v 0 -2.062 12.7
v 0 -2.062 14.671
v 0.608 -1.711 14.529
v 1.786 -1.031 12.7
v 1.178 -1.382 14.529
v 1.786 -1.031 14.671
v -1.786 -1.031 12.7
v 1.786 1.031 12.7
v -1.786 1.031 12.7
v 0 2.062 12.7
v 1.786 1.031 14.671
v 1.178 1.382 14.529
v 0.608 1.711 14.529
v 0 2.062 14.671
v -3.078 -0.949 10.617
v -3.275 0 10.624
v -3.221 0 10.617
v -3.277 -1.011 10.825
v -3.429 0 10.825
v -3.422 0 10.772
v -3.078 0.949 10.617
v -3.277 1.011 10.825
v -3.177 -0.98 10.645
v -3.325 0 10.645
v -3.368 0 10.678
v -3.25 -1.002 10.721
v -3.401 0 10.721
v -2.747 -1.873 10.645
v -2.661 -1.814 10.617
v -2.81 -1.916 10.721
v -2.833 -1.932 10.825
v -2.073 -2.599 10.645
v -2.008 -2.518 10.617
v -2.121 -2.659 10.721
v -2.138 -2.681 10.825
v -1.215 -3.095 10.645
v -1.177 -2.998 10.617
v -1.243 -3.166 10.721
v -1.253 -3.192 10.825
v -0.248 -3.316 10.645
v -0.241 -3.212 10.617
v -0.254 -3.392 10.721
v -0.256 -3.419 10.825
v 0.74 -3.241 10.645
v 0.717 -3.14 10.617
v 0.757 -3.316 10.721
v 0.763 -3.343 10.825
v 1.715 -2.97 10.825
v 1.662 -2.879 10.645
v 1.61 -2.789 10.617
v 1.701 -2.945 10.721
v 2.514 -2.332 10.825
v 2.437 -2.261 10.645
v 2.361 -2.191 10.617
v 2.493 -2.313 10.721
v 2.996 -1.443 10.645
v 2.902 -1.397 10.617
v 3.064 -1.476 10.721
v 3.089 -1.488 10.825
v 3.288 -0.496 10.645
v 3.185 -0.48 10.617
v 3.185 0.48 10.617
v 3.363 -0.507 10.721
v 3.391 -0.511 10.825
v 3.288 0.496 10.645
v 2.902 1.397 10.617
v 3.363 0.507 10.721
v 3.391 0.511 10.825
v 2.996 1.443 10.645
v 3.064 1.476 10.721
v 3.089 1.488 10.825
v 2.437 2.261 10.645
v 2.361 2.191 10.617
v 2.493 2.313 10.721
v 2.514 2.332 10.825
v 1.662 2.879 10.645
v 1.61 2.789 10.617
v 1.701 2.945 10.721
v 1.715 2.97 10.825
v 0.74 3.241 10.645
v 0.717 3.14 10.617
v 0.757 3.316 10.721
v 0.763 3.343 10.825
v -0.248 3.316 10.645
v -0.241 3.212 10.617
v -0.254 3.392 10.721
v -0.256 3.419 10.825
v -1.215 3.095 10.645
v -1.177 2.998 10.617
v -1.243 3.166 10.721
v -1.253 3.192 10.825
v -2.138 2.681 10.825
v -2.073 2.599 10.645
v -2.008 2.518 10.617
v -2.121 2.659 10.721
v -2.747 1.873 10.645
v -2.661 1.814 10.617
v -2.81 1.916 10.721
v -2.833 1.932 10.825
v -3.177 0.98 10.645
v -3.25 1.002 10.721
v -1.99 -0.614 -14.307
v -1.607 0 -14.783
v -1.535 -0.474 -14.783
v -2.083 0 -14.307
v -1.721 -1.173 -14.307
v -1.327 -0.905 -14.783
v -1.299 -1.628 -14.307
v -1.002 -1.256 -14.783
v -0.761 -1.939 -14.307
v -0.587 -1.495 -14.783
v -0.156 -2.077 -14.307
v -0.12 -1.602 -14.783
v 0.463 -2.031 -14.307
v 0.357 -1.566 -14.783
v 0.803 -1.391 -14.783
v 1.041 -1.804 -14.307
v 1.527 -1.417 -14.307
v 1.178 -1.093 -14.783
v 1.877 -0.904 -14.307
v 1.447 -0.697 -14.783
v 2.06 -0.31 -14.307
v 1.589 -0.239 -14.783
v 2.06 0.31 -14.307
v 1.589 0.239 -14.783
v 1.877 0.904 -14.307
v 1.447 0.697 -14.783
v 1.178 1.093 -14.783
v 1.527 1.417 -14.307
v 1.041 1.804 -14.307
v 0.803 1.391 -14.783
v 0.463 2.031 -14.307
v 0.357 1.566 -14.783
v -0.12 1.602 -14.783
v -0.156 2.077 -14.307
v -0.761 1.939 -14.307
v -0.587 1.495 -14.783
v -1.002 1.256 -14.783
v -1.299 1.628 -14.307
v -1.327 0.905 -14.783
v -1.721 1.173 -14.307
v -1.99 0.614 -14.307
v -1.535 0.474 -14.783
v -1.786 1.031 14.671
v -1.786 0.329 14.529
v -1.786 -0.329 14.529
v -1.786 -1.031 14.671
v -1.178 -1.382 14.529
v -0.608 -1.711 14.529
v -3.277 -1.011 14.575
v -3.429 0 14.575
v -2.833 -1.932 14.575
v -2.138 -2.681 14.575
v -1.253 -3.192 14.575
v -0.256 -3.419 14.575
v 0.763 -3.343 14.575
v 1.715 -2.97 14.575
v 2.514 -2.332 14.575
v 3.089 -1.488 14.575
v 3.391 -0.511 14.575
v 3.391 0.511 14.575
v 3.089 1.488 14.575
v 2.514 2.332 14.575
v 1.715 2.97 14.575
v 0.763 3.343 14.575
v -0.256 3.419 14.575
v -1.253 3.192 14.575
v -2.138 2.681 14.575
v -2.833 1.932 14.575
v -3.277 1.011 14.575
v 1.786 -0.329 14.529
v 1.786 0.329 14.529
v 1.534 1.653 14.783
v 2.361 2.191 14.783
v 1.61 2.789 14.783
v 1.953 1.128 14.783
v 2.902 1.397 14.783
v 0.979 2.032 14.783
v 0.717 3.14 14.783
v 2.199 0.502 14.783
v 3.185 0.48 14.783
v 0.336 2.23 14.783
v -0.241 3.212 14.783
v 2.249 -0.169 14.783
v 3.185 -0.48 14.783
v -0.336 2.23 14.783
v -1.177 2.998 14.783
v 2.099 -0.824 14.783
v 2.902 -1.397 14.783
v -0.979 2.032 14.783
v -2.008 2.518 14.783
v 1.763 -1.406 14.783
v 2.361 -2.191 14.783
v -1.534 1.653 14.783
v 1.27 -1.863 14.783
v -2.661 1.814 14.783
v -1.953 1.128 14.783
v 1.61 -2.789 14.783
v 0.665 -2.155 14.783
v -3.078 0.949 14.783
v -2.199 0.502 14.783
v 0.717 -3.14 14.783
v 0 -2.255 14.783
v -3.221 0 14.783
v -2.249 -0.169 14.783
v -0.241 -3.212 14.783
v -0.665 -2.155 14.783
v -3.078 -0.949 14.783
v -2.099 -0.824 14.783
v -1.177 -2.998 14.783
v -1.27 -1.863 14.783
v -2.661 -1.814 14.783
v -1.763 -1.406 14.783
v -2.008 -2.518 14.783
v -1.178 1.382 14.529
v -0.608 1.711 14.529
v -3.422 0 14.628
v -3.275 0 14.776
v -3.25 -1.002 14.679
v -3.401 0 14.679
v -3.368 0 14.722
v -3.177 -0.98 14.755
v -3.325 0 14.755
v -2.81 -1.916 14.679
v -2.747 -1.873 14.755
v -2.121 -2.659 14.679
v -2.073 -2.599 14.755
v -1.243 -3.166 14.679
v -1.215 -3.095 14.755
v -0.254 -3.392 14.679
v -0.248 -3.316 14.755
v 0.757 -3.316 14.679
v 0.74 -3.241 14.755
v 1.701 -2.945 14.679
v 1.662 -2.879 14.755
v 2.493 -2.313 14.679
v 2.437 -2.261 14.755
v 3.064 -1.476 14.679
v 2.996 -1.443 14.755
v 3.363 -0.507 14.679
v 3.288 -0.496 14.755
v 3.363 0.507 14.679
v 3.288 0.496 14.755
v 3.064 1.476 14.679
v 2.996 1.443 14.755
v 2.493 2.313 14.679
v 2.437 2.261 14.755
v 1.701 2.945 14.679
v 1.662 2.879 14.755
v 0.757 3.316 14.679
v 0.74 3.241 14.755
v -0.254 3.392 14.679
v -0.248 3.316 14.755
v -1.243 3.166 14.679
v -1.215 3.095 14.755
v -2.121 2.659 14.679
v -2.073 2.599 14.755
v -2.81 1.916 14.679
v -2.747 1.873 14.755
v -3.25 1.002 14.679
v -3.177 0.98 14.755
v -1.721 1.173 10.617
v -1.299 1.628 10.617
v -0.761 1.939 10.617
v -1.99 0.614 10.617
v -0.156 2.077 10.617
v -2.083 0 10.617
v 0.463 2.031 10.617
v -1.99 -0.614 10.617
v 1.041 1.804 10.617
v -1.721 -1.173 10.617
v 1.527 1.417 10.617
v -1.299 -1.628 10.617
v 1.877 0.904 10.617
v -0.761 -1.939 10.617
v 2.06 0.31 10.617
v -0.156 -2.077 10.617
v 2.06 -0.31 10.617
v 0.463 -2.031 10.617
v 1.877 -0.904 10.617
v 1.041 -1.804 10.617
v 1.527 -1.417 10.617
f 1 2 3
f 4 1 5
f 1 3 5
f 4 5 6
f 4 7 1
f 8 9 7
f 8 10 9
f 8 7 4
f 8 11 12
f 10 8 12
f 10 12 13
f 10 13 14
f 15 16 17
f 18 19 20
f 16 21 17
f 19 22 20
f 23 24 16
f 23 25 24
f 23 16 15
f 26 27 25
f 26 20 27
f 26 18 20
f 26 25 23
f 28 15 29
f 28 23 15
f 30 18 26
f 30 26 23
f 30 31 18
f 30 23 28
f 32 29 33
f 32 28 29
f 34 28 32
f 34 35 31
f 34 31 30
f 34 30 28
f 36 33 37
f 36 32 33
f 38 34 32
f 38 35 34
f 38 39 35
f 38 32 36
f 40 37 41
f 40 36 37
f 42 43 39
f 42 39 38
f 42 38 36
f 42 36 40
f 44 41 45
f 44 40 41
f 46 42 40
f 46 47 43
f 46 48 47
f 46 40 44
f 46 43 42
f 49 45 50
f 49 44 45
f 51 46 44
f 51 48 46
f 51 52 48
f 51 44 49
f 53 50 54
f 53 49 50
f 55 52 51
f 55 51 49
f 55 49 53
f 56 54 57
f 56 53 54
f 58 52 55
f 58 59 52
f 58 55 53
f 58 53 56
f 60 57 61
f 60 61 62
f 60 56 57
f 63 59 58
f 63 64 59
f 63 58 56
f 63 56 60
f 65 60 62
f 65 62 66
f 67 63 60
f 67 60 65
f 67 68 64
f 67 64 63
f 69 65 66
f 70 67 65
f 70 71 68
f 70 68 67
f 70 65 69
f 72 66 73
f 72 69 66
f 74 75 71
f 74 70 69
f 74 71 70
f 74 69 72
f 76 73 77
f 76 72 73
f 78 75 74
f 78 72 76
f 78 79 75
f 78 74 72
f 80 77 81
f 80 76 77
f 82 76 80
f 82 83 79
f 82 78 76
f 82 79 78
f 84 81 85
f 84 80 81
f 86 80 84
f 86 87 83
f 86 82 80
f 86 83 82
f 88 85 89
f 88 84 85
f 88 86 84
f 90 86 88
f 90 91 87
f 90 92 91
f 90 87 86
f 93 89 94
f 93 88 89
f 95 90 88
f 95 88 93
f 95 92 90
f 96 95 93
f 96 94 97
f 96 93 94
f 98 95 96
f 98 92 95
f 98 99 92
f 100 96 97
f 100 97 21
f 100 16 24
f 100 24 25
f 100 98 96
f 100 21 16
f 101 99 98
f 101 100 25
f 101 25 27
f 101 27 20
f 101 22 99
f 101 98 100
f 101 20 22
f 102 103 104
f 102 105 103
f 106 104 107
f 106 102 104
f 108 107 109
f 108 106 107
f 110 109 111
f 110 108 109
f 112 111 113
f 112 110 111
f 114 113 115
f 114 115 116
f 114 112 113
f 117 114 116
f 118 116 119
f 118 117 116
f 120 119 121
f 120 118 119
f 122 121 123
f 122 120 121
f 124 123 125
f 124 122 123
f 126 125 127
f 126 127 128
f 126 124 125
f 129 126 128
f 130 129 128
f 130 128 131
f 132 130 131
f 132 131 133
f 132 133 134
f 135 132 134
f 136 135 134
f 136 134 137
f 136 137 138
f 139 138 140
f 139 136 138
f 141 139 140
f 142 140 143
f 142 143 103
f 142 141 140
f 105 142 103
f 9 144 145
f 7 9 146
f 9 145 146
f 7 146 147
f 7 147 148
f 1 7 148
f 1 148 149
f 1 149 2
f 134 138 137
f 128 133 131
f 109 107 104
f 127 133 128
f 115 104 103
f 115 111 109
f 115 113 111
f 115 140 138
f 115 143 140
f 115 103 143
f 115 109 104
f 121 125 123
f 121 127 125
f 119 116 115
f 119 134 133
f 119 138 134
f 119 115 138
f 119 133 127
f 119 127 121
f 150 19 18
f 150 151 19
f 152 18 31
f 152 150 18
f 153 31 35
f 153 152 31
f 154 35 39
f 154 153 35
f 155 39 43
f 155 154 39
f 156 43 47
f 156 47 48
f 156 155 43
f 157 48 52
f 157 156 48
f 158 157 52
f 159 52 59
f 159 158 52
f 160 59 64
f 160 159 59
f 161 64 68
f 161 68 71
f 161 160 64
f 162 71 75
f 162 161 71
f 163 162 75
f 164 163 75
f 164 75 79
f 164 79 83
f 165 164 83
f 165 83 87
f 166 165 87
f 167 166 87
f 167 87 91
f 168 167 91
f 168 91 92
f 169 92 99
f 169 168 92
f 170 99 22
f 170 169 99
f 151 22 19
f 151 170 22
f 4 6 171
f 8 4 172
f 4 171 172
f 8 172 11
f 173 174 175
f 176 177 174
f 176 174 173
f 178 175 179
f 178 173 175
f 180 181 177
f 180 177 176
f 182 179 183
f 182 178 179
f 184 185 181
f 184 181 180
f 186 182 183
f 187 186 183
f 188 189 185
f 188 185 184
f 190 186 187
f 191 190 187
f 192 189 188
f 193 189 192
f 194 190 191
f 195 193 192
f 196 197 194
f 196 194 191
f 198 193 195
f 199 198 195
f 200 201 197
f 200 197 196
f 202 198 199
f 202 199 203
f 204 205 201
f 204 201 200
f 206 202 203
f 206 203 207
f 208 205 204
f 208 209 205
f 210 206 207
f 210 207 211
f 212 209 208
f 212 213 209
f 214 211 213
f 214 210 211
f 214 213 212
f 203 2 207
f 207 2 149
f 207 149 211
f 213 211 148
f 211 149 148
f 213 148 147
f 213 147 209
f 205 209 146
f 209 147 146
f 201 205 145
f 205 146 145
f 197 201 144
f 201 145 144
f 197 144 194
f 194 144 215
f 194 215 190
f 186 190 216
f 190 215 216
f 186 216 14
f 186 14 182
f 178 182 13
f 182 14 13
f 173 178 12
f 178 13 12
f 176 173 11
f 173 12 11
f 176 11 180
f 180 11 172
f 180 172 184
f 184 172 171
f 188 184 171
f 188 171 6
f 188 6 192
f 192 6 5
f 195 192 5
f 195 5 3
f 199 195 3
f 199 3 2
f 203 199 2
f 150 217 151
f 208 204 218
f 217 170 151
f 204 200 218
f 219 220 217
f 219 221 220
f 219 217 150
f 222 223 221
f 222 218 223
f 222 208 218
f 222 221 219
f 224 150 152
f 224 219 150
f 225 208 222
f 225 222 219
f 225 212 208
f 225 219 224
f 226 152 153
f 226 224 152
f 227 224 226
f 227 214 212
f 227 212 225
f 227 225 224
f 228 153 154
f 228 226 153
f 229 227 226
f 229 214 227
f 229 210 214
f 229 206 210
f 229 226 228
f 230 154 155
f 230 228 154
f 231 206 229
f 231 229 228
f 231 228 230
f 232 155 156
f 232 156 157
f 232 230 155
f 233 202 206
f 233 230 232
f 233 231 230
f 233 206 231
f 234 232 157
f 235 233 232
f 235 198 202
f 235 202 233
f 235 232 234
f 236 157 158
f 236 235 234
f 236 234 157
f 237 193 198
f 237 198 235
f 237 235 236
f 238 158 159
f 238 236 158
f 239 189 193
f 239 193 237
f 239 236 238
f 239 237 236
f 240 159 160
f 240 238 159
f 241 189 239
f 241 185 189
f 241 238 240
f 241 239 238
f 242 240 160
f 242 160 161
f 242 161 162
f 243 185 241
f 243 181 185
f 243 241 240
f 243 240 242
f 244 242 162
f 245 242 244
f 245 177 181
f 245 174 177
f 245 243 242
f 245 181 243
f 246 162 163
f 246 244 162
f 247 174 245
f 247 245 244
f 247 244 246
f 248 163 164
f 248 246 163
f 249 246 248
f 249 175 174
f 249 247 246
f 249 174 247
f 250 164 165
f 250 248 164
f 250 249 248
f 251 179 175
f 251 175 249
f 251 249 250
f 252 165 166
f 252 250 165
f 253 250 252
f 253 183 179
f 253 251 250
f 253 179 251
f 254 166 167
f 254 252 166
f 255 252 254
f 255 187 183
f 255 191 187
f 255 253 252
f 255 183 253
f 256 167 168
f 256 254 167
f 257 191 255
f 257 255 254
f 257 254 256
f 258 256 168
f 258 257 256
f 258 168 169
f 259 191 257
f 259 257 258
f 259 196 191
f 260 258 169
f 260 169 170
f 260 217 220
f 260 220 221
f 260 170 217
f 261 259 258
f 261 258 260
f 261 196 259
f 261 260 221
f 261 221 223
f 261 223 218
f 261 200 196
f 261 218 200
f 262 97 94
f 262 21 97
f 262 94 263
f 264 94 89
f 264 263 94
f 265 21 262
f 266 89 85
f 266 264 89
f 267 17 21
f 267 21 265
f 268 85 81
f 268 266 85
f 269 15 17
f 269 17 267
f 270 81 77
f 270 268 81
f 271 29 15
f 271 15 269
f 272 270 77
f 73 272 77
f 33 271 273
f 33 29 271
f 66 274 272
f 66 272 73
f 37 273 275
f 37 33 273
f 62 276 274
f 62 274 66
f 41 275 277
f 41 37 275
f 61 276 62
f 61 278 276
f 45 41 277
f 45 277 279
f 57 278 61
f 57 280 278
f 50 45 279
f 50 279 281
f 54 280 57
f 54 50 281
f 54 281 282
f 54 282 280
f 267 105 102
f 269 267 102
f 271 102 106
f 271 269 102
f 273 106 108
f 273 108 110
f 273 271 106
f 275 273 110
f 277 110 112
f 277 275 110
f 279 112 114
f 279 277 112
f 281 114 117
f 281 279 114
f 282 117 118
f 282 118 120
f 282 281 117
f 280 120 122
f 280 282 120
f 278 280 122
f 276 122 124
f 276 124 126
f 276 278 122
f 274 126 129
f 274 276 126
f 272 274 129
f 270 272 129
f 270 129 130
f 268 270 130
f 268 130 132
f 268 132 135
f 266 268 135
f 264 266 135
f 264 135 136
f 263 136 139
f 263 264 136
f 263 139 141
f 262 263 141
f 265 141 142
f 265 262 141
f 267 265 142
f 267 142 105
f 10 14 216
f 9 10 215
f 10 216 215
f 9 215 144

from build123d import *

# Parameters (mm, degrees)
CUT_EXTRUDE1_START = 14.7828
CUT_EXTRUDE1_DEPTH = 2.0828


with BuildPart() as part:
    # Sketch2 → Revolve1 (revolve)
    with BuildSketch(Plane(origin=(0, 0, 0), x_dir=(0, 0, -1), z_dir=(1, 0, 0)), mode=Mode.PRIVATE) as revolve1_sk:
        with BuildLine():
            Line((14.7828, 0), (14.7828, 1.60655))
            Line((14.7828, 1.60655), (14.30655, 2.0828))
            Line((14.30655, 2.0828), (-10.6172, 2.0828))
            Line((-10.6172, 2.0828), (-10.6172, 3.22072))
            ThreePointArc((-10.6172, 3.22072), (-10.6782038, 3.3679962), (-10.82548, 3.429))
            Line((-10.82548, 3.429), (-14.57452, 3.429))
            ThreePointArc((-14.57452, 3.429), (-14.7217962, 3.3679962), (-14.7828, 3.22072))
            Line((-14.7828, 3.22072), (-14.7828, 0))
            Line((-14.7828, 0), (14.7828, 0))
        make_face()
    revolve(revolve1_sk.sketch.rotate(Axis((0, 0, -14.7828), (0, 0, 1)), 90), axis=Axis((0, 0, -14.7828), (0, 0, 1)))

    # Sketch3 → Cut-Extrude1 (cut)
    with BuildSketch(Plane.XY.offset(CUT_EXTRUDE1_START)):
        Polygon((-1.7859375, 1.031111496), (-1.7859375, -1.031111496), (0, -2.062222993), (1.7859375, -1.031111496), (1.7859375, 1.031111496), (0, 2.062222993), align=None)
    extrude(amount=-CUT_EXTRUDE1_DEPTH, mode=Mode.SUBTRACT)

    # Cut-Extrude2 cone 1 section (through the dimple's axis) → Cut-Extrude2 (revolve, cut)
    with BuildSketch(Plane(origin=(0, 0, 14.7828), x_dir=(0, -1, 0), z_dir=(1, 0, 0))):
        Polygon((0, 0), (2.255305827, 0), (0, 1.302101426), align=None)
    revolve(axis=Axis((0, 0, 14.7828), (0, 0, -1)), mode=Mode.SUBTRACT)


solid = part.part
